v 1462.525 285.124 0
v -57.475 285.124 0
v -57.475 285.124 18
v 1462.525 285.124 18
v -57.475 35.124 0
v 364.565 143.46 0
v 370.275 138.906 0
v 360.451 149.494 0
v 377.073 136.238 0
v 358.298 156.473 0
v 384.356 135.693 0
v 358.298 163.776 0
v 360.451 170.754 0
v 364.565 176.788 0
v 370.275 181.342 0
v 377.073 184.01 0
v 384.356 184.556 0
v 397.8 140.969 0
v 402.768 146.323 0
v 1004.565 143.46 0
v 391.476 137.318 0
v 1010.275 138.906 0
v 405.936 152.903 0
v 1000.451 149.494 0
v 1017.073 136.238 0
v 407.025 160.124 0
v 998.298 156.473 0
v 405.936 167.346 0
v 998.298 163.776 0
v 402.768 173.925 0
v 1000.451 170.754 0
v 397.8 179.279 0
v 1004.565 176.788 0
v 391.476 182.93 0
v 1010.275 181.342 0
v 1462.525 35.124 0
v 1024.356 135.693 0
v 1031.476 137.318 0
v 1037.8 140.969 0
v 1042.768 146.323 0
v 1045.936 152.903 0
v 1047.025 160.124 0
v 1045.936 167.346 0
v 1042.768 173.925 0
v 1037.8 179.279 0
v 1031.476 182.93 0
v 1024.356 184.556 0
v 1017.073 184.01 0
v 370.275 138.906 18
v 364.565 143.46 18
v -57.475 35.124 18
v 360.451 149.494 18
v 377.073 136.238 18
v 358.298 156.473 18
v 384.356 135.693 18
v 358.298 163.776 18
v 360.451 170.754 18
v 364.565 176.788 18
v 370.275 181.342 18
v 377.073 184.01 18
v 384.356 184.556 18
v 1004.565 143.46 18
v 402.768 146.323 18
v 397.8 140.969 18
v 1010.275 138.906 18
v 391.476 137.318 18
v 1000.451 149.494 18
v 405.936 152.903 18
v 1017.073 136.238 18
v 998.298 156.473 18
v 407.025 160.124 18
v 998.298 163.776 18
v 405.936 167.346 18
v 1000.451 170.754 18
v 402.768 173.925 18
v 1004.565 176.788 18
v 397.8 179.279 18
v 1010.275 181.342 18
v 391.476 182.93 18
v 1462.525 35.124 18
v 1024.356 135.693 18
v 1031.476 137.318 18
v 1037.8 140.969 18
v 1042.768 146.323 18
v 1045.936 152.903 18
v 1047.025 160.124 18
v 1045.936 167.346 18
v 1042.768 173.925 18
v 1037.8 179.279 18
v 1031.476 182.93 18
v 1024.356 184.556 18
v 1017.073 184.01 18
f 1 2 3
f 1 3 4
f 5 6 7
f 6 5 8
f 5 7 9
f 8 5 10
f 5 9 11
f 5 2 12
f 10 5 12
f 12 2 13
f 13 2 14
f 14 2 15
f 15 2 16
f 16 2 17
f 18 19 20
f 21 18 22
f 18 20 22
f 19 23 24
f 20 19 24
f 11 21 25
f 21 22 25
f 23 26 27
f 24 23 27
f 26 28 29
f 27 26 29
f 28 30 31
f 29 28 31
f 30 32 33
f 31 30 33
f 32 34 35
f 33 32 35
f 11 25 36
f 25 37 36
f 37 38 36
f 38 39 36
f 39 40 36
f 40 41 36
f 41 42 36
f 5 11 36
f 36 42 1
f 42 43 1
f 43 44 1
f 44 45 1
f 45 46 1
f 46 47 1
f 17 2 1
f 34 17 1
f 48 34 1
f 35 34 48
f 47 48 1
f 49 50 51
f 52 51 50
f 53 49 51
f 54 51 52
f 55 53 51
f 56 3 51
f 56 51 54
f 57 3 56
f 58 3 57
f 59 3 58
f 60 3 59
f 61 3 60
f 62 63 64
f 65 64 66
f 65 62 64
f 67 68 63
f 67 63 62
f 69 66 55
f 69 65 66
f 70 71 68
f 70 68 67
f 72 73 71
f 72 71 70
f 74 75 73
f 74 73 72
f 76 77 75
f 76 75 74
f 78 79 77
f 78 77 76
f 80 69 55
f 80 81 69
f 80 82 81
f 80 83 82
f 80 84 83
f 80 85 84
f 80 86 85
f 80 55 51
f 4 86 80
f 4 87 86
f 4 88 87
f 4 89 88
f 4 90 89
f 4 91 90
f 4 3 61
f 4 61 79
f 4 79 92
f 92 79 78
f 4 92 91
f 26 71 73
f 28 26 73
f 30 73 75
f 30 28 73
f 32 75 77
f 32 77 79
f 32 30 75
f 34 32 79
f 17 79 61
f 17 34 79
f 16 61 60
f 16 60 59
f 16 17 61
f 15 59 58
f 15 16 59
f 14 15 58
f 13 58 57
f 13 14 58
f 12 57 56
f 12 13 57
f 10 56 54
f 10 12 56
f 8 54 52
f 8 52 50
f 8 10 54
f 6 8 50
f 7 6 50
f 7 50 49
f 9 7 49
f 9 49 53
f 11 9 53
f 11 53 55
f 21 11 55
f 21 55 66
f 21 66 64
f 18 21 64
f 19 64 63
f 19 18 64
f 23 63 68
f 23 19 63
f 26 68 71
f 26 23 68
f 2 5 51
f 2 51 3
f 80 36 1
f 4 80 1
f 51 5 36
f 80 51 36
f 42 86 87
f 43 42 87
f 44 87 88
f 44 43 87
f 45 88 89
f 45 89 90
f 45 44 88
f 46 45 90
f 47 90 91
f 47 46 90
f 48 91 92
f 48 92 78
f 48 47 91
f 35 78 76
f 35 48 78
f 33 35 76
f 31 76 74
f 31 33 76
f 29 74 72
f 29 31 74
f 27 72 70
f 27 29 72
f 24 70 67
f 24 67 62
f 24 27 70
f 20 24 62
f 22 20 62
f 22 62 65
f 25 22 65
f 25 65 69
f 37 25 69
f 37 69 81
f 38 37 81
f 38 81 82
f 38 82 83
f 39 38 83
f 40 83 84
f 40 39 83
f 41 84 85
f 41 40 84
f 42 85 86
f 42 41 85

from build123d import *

# Parameters (mm, degrees)
F0_W     = 1520
F0_H     = 250
F0_R     = 24.5
F1_DEPTH = 18


with BuildPart() as f1:
    # F0 (on Top) → F1 (new body)
    with BuildSketch(Plane.XY):
        with Locations((702.524772, 160.124058)):
            Rectangle(F0_W, F0_H)
        with Locations((382.524772, 160.124058)):
            Circle(F0_R, mode=Mode.SUBTRACT)
        with Locations((1022.524772, 160.124058)):
            Circle(F0_R, mode=Mode.SUBTRACT)
    extrude(amount=F1_DEPTH)


solid = f1.part
